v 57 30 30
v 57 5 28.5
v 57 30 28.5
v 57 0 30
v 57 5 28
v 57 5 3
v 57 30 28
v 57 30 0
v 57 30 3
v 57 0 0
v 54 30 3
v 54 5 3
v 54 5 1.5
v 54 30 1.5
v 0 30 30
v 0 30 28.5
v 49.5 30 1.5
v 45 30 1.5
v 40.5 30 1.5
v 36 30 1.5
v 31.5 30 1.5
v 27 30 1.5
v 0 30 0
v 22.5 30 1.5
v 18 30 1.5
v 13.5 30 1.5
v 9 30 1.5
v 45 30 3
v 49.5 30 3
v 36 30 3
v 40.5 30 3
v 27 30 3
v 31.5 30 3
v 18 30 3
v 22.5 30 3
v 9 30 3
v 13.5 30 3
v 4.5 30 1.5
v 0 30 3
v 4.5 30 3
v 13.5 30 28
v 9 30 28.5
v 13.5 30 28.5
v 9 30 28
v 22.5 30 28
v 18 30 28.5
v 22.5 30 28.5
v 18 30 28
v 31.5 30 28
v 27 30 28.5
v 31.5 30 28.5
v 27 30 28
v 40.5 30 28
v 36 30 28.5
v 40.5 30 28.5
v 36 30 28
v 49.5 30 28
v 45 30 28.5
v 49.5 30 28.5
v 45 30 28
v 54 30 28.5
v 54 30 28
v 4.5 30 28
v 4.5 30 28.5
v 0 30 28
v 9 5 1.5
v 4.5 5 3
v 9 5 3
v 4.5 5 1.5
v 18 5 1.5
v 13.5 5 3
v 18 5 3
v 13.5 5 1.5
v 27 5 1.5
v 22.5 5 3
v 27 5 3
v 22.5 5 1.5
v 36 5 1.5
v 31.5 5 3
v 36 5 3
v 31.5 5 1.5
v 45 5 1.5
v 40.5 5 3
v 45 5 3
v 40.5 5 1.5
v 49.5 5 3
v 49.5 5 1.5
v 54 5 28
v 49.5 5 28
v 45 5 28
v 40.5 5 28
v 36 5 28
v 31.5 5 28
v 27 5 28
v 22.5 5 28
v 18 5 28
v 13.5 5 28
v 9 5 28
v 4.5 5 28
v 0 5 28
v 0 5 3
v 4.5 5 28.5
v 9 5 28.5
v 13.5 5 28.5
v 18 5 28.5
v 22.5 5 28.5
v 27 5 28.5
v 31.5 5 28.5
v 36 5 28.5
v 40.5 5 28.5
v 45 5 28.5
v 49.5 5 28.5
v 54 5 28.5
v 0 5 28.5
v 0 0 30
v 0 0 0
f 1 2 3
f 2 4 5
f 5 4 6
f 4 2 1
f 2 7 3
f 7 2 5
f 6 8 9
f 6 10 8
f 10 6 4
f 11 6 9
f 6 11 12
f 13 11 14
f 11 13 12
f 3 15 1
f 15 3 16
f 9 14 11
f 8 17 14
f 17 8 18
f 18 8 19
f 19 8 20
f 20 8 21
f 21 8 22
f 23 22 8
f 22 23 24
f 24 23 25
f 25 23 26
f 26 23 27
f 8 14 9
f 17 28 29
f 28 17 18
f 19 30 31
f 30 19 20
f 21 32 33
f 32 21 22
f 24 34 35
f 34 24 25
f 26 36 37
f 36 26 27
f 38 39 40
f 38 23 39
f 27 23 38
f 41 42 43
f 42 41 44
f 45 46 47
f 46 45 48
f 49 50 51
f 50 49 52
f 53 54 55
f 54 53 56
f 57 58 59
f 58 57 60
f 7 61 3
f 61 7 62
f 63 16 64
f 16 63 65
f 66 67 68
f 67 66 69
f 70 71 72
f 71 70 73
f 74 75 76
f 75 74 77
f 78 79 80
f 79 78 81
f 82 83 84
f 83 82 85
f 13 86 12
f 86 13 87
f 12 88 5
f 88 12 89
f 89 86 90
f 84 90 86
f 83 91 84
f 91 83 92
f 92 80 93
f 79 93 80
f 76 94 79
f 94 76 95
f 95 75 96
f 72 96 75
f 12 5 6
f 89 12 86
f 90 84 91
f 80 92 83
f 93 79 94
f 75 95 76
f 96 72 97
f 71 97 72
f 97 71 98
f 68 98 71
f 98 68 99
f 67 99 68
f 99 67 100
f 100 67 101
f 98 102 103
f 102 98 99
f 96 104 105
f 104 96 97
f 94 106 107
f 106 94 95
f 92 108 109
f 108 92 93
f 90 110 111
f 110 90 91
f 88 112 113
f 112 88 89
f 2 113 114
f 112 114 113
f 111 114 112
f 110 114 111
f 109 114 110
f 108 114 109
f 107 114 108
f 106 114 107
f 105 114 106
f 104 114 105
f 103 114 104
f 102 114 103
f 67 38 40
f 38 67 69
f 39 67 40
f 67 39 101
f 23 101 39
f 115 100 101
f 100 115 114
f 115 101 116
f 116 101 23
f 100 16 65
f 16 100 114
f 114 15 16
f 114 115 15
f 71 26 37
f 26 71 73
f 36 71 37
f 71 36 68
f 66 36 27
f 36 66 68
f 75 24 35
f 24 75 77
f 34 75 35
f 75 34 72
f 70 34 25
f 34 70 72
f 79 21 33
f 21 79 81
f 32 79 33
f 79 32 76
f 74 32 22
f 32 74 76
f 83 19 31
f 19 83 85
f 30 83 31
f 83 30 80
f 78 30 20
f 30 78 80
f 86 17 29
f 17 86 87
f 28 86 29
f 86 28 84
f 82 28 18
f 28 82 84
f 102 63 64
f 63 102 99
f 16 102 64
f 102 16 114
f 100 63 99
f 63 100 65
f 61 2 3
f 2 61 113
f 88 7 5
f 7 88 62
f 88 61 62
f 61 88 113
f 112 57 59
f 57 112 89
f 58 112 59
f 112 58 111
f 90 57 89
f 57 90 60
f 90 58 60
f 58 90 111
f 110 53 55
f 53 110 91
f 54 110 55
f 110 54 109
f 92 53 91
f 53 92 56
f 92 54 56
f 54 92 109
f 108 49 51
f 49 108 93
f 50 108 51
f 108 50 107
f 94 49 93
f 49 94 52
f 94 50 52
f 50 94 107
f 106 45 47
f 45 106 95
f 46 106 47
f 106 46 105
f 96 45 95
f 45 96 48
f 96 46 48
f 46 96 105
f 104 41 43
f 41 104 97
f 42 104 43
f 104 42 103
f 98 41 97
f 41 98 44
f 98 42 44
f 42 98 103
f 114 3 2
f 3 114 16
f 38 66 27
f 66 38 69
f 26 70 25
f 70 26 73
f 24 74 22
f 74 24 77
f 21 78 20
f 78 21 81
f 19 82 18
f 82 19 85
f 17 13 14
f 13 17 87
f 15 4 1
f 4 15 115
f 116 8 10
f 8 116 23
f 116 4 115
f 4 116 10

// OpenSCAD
difference() {
  translate([28.5000000000, 15.0000000000, 15.0000000000]) {
    scale([57.0000000000, 30.0000000000, 30.0000000000]) {
      translate([-0.5000000000, -0.5000000000, -0.5000000000]) {
        cube([1, 1, 1]);
      }
    }
  }
  difference() {
    translate([28.5000000000, 17.5000000000, 15.0000606000]) {
      scale([57.0000000000, 25.0000000000, 27.0000000000]) {
        translate([-0.5000000000, -0.5000000000, -0.5000000000]) {
          cube([1, 1, 1]);
        }
      }
    }
    union() {
      union() {
        union() {
          union() {
            union() {
              union() {
                union() {
                  union() {
                    union() {
                      union() {
                        union() {
                          union() {
                            union() {
                              translate([55.5000000000, 17.5000000000, 2.2500000000]) {
                                scale([3.0000000000, 25.0000000000, 1.5000000000]) {
                                  translate([-0.5000000000, -0.5000000000, -0.5000000000]) {
                                    cube([1, 1, 1]);
                                  }
                                }
                              }
                              translate([2.2500000000, 17.5000000000, 2.2500000000]) {
                                scale([4.5000000000, 25.0000000000, 1.5000000000]) {
                                  translate([-0.5000000000, -0.5000000000, -0.5000000000]) {
                                    cube([1, 1, 1]);
                                  }
                                }
                              }
                            }
                            translate([11.2500000000, 17.5000000000, 2.2500000000]) {
                              scale([4.5000000000, 25.0000000000, 1.5000000000]) {
                                translate([-0.5000000000, -0.5000000000, -0.5000000000]) {
                                  cube([1, 1, 1]);
                                }
                              }
                            }
                          }
                          translate([20.2500000000, 17.5000000000, 2.2500000000]) {
                            scale([4.5000000000, 25.0000000000, 1.5000000000]) {
                              translate([-0.5000000000, -0.5000000000, -0.5000000000]) {
                                cube([1, 1, 1]);
                              }
                            }
                          }
                        }
                        translate([29.2500000000, 17.5000000000, 2.2500000000]) {
                          scale([4.5000000000, 25.0000000000, 1.5000000000]) {
                            translate([-0.5000000000, -0.5000000000, -0.5000000000]) {
                              cube([1, 1, 1]);
                            }
                          }
                        }
                      }
                      translate([38.2500000000, 17.5000000000, 2.2500000000]) {
                        scale([4.5000000000, 25.0000000000, 1.5000000000]) {
                          translate([-0.5000000000, -0.5000000000, -0.5000000000]) {
                            cube([1, 1, 1]);
                          }
                        }
                      }
                    }
                    translate([47.2500000000, 17.5000000000, 2.2500000000]) {
                      scale([4.5000000000, 25.0000000000, 1.5000000000]) {
                        translate([-0.5000000000, -0.5000000000, -0.5000000000]) {
                          cube([1, 1, 1]);
                        }
                      }
                    }
                  }
                  translate([2.2500000000, 17.5000000000, 28.2500000000]) {
                    scale([4.5000000000, 25.0000000000, 0.5000000000]) {
                      translate([-0.5000000000, -0.5000000000, -0.5000000000]) {
                        cube([1, 1, 1]);
                      }
                    }
                  }
                }
                translate([55.5000000000, 17.5000000000, 28.2500000000]) {
                  scale([3.0000000000, 25.0000000000, 0.5000000000]) {
                    translate([-0.5000000000, -0.5000000000, -0.5000000000]) {
                      cube([1, 1, 1]);
                    }
                  }
                }
              }
              translate([47.2500000000, 17.5000000000, 28.2500000000]) {
                scale([4.5000000000, 25.0000000000, 0.5000000000]) {
                  translate([-0.5000000000, -0.5000000000, -0.5000000000]) {
                    cube([1, 1, 1]);
                  }
                }
              }
            }
            translate([38.2500000000, 17.5000000000, 28.2500000000]) {
              scale([4.5000000000, 25.0000000000, 0.5000000000]) {
                translate([-0.5000000000, -0.5000000000, -0.5000000000]) {
                  cube([1, 1, 1]);
                }
              }
            }
          }
          translate([29.2500000000, 17.5000000000, 28.2500000000]) {
            scale([4.5000000000, 25.0000000000, 0.5000000000]) {
              translate([-0.5000000000, -0.5000000000, -0.5000000000]) {
                cube([1, 1, 1]);
              }
            }
          }
        }
        translate([20.2500000000, 17.5000000000, 28.2500000000]) {
          scale([4.5000000000, 25.0000000000, 0.5000000000]) {
            translate([-0.5000000000, -0.5000000000, -0.5000000000]) {
              cube([1, 1, 1]);
            }
          }
        }
      }
      translate([11.2500000000, 17.5000000000, 28.2500000000]) {
        scale([4.5000000000, 25.0000000000, 0.5000000000]) {
          translate([-0.5000000000, -0.5000000000, -0.5000000000]) {
            cube([1, 1, 1]);
          }
        }
      }
    }
  }
}
